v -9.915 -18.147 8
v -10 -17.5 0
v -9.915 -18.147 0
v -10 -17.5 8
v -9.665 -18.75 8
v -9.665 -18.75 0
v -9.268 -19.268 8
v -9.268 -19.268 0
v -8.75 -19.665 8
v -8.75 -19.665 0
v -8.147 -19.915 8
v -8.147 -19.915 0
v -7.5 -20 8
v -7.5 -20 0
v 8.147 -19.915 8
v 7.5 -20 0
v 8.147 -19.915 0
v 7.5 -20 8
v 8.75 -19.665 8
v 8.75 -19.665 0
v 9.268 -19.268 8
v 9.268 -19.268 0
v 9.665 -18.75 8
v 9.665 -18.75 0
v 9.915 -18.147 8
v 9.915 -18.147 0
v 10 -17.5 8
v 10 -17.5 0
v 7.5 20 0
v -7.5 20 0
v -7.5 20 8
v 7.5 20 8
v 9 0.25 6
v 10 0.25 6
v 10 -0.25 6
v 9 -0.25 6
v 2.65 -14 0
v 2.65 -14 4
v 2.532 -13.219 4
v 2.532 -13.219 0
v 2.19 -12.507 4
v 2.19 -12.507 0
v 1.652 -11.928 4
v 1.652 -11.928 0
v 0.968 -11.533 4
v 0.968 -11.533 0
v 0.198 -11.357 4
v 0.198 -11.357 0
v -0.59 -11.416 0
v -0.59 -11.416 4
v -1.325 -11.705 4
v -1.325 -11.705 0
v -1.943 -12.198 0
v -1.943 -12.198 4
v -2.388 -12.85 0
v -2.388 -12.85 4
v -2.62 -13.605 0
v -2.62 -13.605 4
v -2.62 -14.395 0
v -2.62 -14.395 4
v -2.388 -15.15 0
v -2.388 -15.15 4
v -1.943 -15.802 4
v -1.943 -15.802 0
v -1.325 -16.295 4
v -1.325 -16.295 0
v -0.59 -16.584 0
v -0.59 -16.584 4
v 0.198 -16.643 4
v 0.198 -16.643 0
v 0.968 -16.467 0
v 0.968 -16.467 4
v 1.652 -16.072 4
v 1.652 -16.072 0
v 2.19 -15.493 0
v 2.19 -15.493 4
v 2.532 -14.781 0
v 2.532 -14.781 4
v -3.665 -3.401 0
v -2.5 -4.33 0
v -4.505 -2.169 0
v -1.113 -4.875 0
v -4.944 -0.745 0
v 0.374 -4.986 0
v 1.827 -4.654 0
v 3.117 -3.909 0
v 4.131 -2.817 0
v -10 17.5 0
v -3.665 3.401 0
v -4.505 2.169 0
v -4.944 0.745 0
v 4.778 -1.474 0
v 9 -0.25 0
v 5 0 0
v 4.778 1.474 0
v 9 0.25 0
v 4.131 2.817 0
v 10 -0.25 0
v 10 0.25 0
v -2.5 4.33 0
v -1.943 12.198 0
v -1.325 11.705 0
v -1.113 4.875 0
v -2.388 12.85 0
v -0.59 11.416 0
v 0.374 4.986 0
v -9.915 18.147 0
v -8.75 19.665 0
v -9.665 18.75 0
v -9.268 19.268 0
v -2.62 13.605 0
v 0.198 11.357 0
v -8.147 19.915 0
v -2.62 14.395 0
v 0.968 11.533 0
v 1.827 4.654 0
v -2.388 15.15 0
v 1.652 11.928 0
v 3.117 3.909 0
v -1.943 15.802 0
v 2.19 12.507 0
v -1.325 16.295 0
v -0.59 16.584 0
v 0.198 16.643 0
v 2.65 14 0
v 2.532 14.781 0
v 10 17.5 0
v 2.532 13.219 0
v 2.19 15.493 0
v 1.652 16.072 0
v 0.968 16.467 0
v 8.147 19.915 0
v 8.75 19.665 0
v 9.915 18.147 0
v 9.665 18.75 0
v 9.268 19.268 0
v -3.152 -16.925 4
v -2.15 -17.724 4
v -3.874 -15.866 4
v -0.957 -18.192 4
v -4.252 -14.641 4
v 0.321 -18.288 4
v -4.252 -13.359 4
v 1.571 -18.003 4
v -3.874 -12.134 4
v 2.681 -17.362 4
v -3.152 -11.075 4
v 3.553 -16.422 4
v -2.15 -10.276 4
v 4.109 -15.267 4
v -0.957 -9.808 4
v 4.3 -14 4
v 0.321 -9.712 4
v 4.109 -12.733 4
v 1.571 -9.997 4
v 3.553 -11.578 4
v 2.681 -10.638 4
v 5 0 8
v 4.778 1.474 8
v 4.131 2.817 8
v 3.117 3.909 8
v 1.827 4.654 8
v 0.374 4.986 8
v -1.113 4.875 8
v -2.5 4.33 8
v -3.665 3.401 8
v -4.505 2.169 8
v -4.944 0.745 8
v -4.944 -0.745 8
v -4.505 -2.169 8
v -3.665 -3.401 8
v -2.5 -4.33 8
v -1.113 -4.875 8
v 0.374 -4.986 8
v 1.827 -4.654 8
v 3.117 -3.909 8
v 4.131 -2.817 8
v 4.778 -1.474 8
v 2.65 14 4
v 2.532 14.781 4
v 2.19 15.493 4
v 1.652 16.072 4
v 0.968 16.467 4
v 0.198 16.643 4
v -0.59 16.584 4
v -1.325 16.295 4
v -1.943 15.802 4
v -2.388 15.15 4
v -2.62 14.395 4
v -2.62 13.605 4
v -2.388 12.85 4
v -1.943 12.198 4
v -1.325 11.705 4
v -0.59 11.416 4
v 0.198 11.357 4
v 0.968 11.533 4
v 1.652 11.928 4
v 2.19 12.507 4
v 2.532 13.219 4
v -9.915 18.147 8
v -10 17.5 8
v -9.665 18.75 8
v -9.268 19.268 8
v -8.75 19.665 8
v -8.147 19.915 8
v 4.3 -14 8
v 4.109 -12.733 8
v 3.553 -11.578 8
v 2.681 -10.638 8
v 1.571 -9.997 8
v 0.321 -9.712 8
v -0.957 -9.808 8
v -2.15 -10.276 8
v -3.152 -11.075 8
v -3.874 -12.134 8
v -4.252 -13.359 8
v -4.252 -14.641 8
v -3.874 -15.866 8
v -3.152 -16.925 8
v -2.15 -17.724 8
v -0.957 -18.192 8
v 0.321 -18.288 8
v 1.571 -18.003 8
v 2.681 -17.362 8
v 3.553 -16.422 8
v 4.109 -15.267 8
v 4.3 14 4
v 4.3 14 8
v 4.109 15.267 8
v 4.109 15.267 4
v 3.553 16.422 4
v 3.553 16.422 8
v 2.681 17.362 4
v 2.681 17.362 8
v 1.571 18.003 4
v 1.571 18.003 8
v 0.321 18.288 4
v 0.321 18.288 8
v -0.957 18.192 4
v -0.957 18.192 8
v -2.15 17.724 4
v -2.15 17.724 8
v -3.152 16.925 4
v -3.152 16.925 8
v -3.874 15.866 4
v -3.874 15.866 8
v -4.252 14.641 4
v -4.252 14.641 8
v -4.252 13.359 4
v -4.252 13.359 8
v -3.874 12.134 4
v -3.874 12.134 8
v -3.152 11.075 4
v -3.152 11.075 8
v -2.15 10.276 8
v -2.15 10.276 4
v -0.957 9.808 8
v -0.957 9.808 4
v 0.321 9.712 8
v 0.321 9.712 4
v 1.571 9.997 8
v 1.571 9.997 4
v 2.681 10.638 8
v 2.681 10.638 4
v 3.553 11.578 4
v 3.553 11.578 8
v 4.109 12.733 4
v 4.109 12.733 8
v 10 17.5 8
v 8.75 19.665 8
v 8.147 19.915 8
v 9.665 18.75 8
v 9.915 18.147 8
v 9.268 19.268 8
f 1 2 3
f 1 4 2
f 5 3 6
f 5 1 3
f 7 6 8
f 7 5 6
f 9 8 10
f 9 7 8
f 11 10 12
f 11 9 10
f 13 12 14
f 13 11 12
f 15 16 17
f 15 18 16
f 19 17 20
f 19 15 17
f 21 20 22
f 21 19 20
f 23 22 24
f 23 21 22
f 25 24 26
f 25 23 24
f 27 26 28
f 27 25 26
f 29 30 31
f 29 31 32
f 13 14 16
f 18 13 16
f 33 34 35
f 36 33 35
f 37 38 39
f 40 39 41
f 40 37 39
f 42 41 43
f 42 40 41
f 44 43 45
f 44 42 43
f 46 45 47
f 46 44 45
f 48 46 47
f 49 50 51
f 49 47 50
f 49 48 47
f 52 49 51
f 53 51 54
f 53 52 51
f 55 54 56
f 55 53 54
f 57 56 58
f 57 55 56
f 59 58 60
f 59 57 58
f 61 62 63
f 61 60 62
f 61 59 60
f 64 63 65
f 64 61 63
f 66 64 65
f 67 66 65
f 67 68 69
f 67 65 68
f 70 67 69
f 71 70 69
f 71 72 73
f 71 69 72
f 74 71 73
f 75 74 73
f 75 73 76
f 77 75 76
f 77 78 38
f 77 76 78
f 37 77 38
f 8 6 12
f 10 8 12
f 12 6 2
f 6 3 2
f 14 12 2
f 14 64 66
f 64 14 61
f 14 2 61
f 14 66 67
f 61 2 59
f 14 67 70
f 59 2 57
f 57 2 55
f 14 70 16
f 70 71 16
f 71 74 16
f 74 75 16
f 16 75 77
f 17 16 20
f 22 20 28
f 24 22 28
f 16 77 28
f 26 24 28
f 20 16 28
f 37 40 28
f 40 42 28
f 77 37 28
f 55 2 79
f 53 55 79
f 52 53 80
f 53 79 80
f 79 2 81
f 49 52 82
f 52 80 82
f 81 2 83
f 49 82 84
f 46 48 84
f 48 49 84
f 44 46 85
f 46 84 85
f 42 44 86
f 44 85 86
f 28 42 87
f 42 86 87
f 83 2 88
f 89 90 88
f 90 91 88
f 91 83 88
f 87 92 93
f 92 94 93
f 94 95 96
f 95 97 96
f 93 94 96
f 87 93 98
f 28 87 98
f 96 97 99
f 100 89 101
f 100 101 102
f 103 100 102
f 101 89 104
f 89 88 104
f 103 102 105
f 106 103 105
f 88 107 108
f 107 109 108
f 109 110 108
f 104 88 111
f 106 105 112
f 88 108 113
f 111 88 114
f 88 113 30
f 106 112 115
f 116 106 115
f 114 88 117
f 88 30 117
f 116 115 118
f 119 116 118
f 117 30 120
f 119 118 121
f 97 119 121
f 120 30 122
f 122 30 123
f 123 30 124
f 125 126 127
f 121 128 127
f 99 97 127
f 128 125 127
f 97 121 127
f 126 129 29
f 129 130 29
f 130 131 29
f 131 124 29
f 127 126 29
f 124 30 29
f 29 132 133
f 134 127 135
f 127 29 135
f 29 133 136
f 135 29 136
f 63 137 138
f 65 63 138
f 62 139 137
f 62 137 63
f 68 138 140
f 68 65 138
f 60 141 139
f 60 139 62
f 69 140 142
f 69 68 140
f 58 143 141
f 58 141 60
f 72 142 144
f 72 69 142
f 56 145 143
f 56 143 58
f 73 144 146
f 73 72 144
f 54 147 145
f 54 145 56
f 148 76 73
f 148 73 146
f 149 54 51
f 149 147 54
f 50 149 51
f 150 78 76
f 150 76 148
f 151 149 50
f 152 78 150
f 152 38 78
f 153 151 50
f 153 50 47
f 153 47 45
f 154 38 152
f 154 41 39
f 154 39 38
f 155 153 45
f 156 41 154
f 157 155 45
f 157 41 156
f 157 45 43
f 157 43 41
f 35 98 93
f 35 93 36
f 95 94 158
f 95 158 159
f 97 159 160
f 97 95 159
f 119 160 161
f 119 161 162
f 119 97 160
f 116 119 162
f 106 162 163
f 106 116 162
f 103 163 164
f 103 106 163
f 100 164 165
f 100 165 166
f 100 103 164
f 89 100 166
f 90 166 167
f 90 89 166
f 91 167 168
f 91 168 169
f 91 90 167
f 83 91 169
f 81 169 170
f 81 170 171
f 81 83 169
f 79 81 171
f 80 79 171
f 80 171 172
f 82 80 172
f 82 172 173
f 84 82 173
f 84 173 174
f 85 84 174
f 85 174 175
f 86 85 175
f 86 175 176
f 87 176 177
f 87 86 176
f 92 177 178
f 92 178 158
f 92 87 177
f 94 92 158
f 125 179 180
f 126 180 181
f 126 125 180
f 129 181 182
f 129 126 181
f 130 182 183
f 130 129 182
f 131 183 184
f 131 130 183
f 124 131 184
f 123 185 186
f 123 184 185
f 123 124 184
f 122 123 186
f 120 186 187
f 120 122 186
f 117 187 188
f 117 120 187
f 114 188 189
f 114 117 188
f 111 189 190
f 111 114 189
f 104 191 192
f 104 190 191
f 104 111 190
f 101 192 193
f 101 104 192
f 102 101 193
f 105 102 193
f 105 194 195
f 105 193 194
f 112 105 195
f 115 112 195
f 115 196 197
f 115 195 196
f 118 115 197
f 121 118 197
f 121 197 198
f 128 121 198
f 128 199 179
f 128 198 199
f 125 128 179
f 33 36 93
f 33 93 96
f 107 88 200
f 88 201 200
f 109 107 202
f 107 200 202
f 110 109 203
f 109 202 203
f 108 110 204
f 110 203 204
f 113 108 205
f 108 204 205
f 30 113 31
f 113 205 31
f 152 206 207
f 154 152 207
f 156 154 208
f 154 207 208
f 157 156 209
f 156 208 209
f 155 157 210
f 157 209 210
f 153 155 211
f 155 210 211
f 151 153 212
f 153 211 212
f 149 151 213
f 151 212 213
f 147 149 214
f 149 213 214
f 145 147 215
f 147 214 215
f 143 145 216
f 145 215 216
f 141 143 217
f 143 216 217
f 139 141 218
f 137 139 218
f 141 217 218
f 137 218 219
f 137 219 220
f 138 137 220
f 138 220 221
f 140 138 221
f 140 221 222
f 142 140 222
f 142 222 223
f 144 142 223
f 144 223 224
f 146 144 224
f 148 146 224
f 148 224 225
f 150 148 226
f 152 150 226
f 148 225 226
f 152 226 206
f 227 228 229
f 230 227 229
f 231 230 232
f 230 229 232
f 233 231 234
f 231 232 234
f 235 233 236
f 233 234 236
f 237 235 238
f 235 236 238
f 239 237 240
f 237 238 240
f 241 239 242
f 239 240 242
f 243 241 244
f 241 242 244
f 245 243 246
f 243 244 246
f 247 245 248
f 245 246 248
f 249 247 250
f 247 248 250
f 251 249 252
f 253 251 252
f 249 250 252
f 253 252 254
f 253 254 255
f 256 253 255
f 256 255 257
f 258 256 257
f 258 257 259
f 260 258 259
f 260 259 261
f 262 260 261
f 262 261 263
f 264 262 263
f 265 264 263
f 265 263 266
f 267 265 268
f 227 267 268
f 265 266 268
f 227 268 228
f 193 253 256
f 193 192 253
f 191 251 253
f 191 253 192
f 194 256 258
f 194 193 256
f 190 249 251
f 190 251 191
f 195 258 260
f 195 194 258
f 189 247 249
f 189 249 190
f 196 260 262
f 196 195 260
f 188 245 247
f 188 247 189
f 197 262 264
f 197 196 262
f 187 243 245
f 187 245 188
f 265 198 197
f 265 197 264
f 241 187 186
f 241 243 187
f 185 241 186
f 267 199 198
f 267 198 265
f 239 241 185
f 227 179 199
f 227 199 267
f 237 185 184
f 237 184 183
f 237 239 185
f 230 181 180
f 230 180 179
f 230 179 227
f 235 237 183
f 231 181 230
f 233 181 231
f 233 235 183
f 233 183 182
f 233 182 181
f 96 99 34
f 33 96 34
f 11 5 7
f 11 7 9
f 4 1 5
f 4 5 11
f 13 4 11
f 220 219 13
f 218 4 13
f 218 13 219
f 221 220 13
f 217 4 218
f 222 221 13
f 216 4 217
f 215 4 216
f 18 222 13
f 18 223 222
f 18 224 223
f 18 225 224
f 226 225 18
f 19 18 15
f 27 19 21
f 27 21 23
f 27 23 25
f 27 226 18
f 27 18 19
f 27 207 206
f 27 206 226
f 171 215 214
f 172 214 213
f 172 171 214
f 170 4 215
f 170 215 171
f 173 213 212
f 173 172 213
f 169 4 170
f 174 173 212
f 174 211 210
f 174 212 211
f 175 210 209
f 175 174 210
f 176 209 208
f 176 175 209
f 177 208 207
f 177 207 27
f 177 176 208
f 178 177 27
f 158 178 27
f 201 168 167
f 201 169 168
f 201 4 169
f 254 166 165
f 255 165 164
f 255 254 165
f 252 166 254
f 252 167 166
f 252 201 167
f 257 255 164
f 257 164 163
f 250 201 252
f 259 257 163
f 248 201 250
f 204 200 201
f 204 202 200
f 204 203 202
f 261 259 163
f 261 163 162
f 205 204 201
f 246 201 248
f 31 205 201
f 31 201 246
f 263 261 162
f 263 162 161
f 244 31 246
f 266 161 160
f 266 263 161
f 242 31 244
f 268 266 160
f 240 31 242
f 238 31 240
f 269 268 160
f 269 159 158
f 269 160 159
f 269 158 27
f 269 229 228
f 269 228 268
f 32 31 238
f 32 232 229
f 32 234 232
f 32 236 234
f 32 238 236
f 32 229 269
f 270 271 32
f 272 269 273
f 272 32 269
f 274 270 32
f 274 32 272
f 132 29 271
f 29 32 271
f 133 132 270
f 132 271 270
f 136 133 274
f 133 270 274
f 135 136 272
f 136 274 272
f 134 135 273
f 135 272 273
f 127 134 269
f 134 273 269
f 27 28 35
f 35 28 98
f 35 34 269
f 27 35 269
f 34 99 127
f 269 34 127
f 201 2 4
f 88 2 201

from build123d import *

# Parameters (mm, degrees)
F1_W     = 20
F1_H     = 40
F1_R     = 2.65
F1_R_2   = 5
F2_DEPTH = 8
F3_R     = 4.3
F4_DEPTH = 4
F5_R     = 2.5
F6_W     = 0.25
F6_H     = 6
F7_DEPTH = 1


with BuildPart() as f2:
    # F1 (on Top) → F2 (new body)
    with BuildSketch(Plane.XY):
        Rectangle(F1_W, F1_H)
        with Locations((0, -14)):
            Circle(F1_R, mode=Mode.SUBTRACT)
        Circle(F1_R_2, mode=Mode.SUBTRACT)
        with Locations((0, 14)):
            Circle(F1_R, mode=Mode.SUBTRACT)
    extrude(amount=F2_DEPTH)

    # F3 (on face) → F4 (cut)
    with BuildSketch(Plane.XY.offset(8)):
        with Locations((0, 14)):
            Circle(F3_R)
        with Locations((0, -14)):
            Circle(F3_R)
    extrude(amount=-F4_DEPTH, mode=Mode.SUBTRACT)

    # F5
    f5_edges = [f2.edges().sort_by_distance(p)[0] for p in [
        (10, -20, 4),
        (-10, -20, 4),
        (10, 20, 4),
        (-10, 20, 4),
    ]]
    fillet(f5_edges, radius=F5_R)

    # F6 (on face) → F7 (cut)
    with BuildSketch(Plane.YZ.offset(10)):
        with Locations((0.125, 3)):
            Rectangle(F6_W, F6_H)
        with Locations((-0.125, 3)):
            Rectangle(F6_W, F6_H)
    extrude(amount=-F7_DEPTH, mode=Mode.SUBTRACT)


solid = f2.part
